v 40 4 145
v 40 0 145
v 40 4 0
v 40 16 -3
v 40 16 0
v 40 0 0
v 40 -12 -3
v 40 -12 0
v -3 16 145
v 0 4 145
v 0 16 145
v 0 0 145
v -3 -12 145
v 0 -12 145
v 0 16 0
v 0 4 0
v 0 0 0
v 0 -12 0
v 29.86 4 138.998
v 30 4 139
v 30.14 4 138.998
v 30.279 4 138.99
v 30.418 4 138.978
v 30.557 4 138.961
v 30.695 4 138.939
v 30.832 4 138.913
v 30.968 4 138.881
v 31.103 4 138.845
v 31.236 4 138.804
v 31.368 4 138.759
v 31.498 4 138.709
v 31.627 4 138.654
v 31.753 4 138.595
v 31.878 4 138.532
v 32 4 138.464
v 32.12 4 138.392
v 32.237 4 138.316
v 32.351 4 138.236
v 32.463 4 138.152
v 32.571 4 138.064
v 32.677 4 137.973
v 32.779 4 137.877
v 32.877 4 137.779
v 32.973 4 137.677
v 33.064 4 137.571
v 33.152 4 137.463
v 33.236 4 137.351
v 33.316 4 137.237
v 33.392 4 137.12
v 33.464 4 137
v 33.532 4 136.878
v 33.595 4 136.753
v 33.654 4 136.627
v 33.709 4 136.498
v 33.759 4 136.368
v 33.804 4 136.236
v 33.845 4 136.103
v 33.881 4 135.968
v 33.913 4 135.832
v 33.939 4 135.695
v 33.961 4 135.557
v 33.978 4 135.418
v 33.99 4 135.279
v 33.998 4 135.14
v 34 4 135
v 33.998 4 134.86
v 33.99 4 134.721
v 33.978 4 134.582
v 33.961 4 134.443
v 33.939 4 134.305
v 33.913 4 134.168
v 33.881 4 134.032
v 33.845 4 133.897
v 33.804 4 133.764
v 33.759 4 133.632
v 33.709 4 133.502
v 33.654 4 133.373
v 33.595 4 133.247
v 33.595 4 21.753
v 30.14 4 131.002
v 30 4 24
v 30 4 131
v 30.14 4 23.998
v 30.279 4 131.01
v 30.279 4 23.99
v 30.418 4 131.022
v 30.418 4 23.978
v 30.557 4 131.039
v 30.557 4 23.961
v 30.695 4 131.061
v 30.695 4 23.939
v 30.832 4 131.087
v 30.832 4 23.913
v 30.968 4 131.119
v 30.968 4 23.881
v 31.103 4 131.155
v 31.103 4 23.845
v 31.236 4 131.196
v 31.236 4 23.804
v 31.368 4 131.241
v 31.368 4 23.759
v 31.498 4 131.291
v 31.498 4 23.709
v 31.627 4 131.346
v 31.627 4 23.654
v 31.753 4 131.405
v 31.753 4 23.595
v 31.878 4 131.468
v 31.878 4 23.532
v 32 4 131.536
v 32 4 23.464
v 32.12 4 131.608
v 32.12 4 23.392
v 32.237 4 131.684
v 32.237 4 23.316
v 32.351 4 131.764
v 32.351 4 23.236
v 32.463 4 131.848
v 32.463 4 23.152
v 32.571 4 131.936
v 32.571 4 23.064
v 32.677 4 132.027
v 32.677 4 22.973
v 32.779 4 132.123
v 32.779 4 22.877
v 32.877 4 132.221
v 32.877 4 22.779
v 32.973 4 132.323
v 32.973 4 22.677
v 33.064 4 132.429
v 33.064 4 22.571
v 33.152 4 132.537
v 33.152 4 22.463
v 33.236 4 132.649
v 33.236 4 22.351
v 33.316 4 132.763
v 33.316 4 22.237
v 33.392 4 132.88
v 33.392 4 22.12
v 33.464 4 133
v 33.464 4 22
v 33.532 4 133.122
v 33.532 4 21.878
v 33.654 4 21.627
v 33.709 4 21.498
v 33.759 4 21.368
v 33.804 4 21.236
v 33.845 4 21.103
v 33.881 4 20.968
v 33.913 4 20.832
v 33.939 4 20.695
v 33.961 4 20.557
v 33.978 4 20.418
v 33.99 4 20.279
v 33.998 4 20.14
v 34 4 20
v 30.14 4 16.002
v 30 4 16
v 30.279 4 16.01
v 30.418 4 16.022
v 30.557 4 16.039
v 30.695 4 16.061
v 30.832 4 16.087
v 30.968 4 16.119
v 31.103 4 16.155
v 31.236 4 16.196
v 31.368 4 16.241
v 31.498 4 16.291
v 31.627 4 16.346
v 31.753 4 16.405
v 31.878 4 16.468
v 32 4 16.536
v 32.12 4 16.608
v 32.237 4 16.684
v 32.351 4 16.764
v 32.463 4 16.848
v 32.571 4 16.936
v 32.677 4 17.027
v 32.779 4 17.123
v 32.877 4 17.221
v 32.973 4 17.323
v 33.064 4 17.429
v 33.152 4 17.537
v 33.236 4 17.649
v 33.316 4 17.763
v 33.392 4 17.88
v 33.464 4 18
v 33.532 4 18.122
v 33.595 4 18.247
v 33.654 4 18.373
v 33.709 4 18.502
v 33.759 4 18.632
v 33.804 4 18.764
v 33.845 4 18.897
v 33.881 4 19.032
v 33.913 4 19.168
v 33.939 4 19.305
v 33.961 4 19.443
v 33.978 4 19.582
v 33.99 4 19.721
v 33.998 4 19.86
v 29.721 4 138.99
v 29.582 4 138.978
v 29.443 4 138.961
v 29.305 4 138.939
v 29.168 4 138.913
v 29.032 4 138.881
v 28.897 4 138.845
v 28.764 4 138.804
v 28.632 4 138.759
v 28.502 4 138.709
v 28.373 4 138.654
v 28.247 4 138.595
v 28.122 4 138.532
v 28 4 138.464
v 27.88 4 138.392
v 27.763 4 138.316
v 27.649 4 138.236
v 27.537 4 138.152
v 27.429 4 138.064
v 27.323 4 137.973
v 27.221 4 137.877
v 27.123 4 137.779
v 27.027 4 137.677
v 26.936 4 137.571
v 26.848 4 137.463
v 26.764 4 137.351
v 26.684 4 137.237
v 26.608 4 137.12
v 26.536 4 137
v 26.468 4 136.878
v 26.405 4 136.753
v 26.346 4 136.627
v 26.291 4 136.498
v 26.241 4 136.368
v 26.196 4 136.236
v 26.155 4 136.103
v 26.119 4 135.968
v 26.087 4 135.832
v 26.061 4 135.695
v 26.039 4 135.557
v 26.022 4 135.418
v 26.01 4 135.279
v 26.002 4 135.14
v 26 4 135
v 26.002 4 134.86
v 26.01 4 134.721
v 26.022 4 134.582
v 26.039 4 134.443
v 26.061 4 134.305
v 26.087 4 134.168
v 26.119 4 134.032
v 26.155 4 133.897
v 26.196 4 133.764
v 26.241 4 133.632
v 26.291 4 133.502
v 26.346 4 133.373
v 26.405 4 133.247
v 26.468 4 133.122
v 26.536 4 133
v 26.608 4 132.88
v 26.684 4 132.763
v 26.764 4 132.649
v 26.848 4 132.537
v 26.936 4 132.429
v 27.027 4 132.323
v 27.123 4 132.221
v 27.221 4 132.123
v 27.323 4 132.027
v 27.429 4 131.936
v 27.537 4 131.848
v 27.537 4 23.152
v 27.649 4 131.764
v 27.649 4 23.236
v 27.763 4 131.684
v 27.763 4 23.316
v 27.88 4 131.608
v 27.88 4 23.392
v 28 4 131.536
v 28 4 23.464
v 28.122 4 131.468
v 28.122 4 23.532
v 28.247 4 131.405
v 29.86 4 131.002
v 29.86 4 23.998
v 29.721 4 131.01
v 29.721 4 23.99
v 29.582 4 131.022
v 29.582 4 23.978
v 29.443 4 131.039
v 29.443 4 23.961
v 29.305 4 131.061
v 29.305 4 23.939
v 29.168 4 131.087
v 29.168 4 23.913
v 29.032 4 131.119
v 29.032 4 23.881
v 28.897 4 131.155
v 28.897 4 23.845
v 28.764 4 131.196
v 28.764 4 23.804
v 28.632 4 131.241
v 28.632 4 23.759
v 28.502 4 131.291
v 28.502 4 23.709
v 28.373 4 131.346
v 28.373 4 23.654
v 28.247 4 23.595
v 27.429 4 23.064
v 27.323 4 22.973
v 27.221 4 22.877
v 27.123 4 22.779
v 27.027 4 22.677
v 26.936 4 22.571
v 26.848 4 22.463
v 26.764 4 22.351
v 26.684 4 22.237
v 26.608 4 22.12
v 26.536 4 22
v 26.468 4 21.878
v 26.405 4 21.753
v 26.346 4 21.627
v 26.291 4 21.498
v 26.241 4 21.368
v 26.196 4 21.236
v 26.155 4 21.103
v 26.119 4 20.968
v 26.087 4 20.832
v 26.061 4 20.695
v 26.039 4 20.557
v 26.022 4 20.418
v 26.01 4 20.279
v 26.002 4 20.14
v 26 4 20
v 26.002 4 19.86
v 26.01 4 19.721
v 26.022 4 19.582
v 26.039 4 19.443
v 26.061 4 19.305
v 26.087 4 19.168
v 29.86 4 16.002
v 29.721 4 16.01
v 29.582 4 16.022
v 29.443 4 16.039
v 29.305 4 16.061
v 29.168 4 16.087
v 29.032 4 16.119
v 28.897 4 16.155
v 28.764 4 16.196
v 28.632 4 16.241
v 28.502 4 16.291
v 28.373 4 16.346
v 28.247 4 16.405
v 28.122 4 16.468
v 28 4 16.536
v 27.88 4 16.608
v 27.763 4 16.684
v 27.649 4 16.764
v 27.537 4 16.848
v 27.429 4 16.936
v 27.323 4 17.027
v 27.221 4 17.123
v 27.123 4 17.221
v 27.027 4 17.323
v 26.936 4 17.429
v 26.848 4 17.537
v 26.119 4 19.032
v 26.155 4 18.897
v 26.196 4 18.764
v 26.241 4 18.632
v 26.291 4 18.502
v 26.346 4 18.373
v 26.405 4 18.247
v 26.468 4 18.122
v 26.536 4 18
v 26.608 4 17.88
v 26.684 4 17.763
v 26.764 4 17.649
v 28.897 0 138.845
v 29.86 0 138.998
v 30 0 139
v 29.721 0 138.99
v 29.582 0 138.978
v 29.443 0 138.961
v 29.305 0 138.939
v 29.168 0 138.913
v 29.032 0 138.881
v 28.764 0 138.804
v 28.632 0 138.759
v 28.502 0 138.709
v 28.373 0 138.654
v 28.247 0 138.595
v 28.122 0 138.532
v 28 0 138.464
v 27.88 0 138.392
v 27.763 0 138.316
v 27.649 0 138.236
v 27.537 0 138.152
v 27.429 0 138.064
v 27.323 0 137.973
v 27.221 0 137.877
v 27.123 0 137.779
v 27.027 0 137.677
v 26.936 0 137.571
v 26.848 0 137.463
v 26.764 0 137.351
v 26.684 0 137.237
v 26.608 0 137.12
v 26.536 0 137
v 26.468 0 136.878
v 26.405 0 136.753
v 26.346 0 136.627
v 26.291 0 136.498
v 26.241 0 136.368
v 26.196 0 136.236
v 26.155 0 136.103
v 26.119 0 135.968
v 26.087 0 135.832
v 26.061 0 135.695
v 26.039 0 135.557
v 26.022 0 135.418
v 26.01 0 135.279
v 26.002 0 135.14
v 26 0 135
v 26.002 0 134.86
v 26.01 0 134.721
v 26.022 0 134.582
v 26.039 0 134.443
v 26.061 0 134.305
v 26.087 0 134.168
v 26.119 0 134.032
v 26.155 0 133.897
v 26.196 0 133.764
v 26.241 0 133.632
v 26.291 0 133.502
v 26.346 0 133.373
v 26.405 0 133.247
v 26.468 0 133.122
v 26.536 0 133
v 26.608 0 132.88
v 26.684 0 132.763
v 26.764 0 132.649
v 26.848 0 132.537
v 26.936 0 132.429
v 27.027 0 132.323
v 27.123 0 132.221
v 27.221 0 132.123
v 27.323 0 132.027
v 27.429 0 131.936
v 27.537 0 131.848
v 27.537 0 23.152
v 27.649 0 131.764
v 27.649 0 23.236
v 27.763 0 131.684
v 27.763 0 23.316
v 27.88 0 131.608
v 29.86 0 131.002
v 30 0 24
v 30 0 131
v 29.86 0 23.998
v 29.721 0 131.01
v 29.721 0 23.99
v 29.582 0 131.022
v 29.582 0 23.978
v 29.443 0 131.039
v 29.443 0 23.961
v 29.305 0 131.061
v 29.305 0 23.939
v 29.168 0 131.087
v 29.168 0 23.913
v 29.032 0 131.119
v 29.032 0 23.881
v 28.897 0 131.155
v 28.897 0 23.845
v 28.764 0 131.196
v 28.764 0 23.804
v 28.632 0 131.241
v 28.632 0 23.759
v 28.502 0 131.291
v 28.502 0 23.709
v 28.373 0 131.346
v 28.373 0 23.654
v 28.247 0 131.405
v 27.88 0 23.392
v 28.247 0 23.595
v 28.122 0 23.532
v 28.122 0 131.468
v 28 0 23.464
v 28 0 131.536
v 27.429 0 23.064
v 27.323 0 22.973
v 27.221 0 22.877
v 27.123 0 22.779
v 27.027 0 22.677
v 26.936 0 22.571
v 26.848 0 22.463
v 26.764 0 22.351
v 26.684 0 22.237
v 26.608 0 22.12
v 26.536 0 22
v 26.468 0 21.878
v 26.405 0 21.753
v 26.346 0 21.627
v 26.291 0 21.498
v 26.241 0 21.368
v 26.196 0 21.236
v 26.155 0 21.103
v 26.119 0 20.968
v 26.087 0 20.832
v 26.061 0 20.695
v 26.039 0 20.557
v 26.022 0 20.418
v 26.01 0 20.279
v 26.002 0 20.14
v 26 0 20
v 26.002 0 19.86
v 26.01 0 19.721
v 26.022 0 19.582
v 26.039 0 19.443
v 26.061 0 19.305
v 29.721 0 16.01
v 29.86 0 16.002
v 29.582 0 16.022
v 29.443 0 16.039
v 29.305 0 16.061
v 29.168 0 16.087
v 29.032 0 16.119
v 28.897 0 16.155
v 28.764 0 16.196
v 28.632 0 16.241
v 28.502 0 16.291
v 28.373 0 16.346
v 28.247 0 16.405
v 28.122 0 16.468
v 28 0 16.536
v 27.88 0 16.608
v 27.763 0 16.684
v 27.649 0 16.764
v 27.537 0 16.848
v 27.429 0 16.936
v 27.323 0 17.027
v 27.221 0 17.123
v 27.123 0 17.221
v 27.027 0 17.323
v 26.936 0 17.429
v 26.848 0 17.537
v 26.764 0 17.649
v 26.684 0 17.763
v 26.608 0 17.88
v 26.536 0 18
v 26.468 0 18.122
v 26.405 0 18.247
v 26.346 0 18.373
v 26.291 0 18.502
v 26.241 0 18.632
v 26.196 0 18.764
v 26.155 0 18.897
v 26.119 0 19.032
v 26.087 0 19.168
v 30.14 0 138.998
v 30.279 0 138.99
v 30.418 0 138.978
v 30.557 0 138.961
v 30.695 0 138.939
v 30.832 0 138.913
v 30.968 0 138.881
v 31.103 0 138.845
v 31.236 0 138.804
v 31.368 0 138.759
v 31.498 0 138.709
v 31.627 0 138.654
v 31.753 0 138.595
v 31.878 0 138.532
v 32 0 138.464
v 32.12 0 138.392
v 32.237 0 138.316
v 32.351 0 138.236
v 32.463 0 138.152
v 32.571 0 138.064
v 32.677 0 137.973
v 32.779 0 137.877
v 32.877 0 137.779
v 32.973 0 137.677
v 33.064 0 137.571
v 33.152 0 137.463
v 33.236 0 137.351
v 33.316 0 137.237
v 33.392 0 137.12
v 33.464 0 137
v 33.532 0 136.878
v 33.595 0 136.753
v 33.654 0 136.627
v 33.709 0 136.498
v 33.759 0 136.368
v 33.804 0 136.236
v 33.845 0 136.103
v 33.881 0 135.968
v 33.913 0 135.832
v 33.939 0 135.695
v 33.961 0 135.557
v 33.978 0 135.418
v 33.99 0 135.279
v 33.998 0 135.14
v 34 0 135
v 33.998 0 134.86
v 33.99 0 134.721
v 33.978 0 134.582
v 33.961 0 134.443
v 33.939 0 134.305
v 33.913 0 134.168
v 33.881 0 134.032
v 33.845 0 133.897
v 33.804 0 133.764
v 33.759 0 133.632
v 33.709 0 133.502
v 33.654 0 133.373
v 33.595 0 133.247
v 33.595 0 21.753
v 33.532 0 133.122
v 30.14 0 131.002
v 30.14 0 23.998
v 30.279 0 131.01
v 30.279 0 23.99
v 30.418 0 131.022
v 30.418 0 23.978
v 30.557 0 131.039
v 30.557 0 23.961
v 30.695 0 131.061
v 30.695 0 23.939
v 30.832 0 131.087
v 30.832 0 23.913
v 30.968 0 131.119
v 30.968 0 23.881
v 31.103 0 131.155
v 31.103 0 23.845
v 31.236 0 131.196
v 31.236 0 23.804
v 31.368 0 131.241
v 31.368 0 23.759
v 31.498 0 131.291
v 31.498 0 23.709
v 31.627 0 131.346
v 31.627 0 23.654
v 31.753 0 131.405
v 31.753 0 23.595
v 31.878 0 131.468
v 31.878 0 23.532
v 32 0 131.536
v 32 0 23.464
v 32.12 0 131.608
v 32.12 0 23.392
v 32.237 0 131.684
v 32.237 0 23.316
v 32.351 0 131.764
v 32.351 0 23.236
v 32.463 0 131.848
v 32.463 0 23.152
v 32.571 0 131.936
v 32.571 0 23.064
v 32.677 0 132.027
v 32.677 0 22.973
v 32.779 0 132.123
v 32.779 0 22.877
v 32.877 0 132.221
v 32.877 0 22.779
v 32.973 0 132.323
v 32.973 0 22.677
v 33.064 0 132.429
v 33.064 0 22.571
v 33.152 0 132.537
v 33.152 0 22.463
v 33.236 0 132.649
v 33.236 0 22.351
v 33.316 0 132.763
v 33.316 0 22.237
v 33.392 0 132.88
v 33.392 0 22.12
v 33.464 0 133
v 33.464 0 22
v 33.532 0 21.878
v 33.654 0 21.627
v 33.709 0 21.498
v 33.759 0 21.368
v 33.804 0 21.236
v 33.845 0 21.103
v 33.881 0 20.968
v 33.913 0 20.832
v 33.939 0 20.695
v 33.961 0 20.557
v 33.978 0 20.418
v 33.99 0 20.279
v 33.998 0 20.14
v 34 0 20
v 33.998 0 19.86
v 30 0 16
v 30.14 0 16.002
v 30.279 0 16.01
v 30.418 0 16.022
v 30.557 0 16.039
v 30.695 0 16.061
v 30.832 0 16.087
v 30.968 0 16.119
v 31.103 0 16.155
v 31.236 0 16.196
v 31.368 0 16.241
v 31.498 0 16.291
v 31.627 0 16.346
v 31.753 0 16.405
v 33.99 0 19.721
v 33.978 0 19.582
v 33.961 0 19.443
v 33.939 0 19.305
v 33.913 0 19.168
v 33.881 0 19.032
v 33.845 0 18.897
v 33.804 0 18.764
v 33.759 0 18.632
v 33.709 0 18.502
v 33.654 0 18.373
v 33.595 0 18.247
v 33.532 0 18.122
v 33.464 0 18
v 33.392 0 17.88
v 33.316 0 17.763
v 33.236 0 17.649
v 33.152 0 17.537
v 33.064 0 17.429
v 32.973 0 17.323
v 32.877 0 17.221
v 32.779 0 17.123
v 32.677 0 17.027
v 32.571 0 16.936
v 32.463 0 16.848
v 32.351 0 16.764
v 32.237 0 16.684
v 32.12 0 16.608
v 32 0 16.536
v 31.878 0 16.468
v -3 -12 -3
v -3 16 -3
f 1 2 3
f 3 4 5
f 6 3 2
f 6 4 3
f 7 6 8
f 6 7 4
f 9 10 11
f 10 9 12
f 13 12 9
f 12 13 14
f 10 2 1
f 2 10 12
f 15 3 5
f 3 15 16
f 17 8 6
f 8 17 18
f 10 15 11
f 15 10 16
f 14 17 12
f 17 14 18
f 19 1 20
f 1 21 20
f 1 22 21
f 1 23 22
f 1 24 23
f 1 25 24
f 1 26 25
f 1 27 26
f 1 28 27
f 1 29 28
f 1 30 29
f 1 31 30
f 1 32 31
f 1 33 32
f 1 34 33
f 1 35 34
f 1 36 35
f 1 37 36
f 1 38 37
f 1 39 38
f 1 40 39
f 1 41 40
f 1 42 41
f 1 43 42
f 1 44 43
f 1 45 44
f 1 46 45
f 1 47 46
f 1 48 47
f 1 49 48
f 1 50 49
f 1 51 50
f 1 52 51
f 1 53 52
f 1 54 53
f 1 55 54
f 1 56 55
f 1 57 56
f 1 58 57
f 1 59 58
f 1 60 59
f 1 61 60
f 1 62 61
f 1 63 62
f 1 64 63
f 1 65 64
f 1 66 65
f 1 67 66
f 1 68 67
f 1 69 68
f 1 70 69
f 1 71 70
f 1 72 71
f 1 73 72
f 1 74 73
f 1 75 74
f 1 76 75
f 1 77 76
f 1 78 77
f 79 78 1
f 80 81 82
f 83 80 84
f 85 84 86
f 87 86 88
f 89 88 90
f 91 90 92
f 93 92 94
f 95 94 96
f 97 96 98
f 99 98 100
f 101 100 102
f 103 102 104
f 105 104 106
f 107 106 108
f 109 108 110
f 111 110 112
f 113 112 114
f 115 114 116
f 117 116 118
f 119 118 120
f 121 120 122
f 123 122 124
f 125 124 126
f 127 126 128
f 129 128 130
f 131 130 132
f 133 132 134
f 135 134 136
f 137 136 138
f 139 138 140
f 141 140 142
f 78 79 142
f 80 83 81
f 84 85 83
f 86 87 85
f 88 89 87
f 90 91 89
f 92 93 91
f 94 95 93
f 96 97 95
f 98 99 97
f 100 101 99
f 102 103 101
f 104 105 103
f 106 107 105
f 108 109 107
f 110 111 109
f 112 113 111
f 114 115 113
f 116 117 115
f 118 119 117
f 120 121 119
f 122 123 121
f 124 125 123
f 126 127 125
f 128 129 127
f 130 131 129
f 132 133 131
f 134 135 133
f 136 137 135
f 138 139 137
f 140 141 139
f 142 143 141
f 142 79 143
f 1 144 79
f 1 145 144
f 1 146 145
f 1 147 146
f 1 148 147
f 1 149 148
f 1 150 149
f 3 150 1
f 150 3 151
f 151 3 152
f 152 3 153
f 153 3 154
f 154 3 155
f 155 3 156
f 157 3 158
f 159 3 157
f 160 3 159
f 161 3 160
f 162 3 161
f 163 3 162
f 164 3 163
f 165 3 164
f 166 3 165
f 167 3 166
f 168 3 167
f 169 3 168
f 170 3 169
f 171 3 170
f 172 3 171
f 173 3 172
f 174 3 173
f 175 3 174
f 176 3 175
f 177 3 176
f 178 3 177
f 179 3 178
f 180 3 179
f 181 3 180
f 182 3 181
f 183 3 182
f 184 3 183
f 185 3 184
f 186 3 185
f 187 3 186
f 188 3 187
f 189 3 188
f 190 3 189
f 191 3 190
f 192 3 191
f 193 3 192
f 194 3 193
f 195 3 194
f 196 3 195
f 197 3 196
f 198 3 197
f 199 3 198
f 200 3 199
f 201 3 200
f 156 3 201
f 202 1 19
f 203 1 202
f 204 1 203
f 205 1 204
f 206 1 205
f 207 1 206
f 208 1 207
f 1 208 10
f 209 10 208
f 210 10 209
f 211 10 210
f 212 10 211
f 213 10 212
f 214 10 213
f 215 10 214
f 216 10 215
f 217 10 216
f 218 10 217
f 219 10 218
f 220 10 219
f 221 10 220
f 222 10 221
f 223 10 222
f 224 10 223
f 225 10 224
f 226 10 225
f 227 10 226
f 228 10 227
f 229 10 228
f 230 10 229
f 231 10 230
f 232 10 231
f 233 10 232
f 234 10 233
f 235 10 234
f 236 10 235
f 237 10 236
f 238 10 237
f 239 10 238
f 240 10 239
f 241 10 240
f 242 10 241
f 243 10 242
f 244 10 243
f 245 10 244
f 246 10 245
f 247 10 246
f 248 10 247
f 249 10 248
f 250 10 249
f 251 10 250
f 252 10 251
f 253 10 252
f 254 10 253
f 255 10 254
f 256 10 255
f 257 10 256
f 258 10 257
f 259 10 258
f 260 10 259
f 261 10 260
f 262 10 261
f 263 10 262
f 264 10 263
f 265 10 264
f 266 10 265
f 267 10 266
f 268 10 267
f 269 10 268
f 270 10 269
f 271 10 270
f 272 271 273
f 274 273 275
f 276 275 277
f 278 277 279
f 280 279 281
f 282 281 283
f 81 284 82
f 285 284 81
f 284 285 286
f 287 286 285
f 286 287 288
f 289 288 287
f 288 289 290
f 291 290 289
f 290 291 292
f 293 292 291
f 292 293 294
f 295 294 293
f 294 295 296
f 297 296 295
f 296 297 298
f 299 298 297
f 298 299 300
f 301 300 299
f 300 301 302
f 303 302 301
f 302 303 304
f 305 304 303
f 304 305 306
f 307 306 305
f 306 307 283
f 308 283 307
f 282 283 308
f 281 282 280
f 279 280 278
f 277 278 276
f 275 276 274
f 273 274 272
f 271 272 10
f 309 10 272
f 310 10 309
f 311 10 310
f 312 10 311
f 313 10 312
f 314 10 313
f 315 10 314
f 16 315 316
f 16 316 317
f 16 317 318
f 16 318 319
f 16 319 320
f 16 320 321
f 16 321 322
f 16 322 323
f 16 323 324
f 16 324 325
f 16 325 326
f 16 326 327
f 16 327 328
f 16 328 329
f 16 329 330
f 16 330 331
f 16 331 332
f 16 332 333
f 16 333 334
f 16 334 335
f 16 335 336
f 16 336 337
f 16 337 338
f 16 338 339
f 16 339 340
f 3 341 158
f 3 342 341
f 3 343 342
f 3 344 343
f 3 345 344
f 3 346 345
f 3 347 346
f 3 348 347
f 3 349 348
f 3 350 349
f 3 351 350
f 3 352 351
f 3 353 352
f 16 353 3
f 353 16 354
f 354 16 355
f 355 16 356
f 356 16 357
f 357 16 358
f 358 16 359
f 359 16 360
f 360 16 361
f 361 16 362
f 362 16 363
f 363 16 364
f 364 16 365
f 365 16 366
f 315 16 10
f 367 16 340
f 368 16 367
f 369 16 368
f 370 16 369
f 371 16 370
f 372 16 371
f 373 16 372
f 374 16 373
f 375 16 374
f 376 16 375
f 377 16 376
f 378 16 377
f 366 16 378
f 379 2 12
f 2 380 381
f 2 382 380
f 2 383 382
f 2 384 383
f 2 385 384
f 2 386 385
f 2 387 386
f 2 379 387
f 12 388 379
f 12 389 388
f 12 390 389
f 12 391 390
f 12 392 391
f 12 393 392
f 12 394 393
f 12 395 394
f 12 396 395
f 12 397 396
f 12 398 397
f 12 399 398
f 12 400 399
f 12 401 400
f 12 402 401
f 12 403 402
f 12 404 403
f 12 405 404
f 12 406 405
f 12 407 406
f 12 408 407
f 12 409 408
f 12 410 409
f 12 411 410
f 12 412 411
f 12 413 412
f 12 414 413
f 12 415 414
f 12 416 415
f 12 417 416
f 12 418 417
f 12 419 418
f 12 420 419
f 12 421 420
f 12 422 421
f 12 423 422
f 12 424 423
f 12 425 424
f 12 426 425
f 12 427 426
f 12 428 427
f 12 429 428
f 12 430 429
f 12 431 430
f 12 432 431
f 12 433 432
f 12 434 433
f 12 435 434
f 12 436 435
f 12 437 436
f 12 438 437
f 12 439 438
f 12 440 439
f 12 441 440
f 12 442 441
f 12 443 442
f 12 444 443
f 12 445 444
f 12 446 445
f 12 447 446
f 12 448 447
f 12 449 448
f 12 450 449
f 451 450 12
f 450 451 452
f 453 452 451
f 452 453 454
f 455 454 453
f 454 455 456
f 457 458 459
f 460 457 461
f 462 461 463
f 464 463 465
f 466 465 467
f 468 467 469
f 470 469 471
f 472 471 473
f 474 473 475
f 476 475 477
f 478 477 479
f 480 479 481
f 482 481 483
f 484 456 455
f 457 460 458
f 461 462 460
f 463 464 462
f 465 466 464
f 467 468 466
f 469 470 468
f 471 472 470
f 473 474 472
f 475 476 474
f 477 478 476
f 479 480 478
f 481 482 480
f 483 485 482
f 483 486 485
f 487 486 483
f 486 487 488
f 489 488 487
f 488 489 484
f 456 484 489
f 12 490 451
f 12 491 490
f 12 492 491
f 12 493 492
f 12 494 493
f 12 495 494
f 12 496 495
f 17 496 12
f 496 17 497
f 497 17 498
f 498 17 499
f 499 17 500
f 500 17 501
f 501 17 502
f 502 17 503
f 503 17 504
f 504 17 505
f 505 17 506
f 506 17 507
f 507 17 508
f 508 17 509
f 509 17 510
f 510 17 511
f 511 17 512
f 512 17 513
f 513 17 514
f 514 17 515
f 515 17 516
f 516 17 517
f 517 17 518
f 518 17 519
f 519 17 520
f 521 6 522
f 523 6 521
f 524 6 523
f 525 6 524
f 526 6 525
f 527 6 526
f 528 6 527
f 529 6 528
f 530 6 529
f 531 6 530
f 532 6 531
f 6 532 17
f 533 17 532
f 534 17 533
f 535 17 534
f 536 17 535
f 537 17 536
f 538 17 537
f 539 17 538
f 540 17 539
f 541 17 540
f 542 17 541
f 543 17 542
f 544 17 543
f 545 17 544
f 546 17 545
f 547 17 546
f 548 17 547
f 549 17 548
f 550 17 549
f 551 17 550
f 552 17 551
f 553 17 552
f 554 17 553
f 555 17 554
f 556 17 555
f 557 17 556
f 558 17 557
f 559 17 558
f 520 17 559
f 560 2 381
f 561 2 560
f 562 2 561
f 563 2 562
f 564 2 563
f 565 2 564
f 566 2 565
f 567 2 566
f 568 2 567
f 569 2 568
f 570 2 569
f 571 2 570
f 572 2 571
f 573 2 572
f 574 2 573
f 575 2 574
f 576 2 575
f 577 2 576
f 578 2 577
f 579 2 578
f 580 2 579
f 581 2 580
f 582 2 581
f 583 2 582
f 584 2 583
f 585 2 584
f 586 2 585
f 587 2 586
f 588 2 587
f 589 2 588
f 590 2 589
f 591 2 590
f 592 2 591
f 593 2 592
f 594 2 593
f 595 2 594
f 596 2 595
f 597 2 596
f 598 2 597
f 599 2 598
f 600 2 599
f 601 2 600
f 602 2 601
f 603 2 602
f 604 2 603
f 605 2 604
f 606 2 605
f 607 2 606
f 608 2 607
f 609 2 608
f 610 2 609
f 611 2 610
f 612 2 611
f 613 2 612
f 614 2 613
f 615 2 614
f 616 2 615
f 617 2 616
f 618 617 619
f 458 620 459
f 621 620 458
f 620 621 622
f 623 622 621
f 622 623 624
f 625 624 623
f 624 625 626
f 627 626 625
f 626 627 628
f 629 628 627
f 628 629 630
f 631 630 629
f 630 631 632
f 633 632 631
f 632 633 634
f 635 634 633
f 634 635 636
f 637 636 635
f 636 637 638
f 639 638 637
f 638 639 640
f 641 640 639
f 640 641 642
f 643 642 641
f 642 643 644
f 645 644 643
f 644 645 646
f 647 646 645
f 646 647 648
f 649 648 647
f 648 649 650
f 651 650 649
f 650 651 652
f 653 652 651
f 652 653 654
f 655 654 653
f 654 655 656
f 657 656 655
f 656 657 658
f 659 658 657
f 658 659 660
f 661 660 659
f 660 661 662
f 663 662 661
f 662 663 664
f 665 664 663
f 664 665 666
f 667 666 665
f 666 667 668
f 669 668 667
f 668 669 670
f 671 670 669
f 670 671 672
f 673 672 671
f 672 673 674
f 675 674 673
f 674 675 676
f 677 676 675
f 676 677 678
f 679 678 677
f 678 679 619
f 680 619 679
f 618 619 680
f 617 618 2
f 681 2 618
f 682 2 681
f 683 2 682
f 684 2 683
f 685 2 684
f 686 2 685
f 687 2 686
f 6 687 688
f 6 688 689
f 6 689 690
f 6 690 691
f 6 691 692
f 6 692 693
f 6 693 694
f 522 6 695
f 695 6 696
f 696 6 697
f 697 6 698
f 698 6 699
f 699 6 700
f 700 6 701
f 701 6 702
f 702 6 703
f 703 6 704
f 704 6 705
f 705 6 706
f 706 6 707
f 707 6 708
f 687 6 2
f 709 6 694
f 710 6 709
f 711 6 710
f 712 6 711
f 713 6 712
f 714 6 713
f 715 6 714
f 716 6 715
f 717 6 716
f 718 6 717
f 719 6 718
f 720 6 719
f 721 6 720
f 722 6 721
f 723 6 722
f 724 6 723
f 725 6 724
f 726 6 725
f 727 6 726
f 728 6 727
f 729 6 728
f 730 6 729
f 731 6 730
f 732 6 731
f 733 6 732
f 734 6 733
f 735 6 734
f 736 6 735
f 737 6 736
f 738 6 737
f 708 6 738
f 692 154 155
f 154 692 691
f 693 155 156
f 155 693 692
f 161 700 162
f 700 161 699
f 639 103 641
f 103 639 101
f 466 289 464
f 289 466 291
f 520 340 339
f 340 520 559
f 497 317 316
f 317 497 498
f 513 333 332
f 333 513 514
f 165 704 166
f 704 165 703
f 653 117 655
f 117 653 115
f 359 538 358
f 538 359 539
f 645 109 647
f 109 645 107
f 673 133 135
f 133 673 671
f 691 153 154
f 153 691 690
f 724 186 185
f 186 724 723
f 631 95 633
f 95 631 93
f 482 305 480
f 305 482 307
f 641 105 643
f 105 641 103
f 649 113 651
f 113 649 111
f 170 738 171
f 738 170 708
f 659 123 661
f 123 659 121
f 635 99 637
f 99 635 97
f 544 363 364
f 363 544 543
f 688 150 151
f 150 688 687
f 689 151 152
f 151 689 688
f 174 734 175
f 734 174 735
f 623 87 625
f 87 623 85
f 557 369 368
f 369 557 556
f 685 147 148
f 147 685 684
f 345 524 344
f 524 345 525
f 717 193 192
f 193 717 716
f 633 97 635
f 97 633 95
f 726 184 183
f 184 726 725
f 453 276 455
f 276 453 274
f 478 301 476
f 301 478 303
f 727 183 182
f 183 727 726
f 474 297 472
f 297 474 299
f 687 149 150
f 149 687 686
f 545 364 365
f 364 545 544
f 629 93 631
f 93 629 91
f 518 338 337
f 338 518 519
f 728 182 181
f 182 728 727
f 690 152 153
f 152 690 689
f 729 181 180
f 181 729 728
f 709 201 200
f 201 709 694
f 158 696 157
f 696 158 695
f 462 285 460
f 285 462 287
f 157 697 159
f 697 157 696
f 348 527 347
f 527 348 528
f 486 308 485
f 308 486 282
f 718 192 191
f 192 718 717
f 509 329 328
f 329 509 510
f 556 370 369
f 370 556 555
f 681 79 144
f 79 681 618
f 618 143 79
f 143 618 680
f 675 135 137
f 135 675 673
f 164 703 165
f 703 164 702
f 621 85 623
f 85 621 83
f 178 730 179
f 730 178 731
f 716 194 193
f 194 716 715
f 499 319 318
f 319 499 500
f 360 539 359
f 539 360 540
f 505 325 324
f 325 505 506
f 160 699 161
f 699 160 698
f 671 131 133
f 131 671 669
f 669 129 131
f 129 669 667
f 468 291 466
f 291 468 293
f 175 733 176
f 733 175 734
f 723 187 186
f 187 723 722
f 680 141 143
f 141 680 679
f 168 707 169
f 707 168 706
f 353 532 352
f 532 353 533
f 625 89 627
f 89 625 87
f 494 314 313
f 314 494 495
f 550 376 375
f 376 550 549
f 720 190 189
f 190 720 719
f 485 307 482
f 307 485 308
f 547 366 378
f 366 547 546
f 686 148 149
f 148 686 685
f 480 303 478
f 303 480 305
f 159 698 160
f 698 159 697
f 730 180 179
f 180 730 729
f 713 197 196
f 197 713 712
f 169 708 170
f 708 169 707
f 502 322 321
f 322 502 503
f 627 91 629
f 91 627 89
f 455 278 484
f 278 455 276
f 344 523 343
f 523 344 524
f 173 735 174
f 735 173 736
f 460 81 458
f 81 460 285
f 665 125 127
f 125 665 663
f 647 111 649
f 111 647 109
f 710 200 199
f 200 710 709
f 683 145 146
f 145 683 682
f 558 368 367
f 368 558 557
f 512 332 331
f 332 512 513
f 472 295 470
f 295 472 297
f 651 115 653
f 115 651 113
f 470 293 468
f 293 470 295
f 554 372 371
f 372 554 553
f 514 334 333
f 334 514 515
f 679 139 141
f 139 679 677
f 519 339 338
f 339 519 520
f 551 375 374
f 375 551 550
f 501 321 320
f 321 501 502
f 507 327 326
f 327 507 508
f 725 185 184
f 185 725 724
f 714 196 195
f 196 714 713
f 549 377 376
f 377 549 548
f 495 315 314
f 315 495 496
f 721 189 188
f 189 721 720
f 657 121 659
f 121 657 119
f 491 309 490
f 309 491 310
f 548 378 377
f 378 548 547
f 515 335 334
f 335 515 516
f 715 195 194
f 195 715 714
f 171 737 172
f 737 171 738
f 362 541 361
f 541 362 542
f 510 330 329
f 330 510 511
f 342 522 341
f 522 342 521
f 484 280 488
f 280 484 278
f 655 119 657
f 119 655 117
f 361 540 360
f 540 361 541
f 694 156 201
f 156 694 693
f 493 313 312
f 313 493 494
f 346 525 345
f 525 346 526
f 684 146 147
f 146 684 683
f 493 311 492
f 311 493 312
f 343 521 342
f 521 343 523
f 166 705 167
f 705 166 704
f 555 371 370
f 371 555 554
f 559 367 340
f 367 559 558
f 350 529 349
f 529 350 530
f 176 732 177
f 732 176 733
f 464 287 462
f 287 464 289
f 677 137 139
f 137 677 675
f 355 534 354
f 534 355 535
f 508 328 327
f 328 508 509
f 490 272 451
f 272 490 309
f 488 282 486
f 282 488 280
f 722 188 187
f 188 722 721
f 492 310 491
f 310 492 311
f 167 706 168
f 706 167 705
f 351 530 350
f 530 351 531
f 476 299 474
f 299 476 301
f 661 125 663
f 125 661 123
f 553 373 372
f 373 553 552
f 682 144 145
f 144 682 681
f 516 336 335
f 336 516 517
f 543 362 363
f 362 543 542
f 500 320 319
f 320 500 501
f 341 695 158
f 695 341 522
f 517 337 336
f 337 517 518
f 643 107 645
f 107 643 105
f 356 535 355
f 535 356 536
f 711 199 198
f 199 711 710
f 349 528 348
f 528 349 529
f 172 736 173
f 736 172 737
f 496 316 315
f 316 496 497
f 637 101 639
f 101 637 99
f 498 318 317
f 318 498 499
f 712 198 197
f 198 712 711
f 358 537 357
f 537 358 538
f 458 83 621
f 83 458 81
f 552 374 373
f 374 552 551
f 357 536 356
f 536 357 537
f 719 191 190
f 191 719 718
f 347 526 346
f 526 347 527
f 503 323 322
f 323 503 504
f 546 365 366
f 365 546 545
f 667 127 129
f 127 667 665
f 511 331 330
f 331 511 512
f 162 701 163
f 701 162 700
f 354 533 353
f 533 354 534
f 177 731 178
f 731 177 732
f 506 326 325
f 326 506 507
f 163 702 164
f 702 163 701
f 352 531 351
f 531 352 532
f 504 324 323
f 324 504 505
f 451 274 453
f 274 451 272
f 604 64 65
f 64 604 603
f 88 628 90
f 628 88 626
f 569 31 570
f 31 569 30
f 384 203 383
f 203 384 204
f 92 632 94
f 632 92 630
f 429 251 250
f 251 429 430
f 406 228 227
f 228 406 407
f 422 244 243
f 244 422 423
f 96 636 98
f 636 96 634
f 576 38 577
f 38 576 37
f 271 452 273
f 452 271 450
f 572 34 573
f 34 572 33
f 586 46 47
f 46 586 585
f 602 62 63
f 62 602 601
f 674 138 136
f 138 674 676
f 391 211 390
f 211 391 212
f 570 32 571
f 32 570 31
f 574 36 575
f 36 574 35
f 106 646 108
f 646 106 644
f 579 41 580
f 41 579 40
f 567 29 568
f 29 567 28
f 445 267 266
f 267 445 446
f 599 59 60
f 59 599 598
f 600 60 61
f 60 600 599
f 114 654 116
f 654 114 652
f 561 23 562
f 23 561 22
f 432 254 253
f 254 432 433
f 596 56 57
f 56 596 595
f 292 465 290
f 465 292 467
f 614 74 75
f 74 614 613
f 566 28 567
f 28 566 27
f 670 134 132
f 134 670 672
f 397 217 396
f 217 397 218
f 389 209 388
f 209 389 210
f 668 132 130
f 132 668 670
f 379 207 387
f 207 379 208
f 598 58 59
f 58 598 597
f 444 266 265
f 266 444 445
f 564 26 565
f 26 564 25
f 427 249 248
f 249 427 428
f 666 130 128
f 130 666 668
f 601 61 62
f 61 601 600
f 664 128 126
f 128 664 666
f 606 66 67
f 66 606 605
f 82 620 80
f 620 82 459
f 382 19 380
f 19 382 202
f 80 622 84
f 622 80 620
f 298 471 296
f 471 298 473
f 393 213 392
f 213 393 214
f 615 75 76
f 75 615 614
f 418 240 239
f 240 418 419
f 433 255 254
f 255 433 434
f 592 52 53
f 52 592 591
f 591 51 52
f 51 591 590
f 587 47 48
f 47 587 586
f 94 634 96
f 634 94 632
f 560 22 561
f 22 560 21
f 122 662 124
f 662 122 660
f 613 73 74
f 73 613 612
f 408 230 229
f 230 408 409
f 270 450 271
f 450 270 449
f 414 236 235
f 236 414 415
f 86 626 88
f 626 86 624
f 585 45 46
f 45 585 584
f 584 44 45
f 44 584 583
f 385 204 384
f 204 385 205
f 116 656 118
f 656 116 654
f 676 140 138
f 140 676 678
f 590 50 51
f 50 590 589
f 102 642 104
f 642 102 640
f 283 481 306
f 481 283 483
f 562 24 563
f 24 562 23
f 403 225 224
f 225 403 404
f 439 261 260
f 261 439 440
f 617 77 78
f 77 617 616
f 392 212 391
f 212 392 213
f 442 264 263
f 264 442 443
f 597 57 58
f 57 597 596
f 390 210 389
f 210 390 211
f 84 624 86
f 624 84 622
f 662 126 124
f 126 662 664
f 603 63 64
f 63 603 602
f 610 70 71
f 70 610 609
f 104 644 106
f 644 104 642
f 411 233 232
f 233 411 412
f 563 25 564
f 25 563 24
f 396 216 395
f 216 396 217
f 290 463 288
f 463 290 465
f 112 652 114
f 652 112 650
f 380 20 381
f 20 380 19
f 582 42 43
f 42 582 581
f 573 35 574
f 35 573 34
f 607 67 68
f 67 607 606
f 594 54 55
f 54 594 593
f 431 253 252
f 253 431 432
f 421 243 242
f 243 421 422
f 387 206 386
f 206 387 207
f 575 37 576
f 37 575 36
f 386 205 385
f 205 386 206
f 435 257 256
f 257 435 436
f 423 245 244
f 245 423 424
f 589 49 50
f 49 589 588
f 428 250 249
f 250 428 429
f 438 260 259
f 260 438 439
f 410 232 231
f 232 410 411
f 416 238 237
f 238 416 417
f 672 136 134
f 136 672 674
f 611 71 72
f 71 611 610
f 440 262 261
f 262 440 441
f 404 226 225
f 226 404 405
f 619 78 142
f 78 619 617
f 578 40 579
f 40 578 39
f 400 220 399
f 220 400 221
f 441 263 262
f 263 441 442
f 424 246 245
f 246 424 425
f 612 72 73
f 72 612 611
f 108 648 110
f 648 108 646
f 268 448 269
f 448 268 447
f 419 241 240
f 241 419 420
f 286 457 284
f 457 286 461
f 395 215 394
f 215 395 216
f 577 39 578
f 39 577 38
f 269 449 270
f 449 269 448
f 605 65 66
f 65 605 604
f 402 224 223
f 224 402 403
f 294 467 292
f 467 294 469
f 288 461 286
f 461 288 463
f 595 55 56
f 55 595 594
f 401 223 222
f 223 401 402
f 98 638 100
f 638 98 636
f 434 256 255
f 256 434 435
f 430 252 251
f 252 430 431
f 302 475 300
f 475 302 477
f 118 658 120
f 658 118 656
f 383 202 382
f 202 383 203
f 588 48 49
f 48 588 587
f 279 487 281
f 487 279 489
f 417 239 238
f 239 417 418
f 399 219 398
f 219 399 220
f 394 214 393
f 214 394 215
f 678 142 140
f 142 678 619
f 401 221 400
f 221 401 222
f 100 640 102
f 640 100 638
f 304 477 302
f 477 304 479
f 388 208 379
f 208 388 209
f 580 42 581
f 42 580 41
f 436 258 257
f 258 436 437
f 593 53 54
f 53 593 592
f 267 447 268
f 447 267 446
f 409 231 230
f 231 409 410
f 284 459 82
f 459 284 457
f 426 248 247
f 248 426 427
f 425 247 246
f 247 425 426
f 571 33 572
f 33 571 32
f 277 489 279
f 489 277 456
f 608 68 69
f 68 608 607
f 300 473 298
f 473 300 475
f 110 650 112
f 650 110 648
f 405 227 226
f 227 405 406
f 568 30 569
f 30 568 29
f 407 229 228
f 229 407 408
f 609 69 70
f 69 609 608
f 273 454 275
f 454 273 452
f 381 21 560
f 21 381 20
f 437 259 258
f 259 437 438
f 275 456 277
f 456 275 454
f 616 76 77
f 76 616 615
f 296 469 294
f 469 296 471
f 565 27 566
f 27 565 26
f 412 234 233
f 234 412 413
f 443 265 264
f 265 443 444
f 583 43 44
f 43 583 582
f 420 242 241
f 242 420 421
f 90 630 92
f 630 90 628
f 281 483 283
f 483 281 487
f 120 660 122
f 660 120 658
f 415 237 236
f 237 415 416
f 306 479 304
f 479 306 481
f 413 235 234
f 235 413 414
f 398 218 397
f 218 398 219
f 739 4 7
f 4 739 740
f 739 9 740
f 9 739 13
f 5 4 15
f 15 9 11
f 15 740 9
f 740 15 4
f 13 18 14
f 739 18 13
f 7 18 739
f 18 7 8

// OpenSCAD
difference() {
    cube([40,4,145],false);
    translate([30,4.5,20]) rotate([90,0,0]) cylinder(5,d=8,$fn=180,true);
    translate([30,4.5,135]) rotate([90,0,0]) cylinder(5,d=8,$fn=180,true);
}
translate([-3,-12,-3]) cube([40+3,28,3],false);
translate([-3,-12,0]) cube([3,28,145],false);
